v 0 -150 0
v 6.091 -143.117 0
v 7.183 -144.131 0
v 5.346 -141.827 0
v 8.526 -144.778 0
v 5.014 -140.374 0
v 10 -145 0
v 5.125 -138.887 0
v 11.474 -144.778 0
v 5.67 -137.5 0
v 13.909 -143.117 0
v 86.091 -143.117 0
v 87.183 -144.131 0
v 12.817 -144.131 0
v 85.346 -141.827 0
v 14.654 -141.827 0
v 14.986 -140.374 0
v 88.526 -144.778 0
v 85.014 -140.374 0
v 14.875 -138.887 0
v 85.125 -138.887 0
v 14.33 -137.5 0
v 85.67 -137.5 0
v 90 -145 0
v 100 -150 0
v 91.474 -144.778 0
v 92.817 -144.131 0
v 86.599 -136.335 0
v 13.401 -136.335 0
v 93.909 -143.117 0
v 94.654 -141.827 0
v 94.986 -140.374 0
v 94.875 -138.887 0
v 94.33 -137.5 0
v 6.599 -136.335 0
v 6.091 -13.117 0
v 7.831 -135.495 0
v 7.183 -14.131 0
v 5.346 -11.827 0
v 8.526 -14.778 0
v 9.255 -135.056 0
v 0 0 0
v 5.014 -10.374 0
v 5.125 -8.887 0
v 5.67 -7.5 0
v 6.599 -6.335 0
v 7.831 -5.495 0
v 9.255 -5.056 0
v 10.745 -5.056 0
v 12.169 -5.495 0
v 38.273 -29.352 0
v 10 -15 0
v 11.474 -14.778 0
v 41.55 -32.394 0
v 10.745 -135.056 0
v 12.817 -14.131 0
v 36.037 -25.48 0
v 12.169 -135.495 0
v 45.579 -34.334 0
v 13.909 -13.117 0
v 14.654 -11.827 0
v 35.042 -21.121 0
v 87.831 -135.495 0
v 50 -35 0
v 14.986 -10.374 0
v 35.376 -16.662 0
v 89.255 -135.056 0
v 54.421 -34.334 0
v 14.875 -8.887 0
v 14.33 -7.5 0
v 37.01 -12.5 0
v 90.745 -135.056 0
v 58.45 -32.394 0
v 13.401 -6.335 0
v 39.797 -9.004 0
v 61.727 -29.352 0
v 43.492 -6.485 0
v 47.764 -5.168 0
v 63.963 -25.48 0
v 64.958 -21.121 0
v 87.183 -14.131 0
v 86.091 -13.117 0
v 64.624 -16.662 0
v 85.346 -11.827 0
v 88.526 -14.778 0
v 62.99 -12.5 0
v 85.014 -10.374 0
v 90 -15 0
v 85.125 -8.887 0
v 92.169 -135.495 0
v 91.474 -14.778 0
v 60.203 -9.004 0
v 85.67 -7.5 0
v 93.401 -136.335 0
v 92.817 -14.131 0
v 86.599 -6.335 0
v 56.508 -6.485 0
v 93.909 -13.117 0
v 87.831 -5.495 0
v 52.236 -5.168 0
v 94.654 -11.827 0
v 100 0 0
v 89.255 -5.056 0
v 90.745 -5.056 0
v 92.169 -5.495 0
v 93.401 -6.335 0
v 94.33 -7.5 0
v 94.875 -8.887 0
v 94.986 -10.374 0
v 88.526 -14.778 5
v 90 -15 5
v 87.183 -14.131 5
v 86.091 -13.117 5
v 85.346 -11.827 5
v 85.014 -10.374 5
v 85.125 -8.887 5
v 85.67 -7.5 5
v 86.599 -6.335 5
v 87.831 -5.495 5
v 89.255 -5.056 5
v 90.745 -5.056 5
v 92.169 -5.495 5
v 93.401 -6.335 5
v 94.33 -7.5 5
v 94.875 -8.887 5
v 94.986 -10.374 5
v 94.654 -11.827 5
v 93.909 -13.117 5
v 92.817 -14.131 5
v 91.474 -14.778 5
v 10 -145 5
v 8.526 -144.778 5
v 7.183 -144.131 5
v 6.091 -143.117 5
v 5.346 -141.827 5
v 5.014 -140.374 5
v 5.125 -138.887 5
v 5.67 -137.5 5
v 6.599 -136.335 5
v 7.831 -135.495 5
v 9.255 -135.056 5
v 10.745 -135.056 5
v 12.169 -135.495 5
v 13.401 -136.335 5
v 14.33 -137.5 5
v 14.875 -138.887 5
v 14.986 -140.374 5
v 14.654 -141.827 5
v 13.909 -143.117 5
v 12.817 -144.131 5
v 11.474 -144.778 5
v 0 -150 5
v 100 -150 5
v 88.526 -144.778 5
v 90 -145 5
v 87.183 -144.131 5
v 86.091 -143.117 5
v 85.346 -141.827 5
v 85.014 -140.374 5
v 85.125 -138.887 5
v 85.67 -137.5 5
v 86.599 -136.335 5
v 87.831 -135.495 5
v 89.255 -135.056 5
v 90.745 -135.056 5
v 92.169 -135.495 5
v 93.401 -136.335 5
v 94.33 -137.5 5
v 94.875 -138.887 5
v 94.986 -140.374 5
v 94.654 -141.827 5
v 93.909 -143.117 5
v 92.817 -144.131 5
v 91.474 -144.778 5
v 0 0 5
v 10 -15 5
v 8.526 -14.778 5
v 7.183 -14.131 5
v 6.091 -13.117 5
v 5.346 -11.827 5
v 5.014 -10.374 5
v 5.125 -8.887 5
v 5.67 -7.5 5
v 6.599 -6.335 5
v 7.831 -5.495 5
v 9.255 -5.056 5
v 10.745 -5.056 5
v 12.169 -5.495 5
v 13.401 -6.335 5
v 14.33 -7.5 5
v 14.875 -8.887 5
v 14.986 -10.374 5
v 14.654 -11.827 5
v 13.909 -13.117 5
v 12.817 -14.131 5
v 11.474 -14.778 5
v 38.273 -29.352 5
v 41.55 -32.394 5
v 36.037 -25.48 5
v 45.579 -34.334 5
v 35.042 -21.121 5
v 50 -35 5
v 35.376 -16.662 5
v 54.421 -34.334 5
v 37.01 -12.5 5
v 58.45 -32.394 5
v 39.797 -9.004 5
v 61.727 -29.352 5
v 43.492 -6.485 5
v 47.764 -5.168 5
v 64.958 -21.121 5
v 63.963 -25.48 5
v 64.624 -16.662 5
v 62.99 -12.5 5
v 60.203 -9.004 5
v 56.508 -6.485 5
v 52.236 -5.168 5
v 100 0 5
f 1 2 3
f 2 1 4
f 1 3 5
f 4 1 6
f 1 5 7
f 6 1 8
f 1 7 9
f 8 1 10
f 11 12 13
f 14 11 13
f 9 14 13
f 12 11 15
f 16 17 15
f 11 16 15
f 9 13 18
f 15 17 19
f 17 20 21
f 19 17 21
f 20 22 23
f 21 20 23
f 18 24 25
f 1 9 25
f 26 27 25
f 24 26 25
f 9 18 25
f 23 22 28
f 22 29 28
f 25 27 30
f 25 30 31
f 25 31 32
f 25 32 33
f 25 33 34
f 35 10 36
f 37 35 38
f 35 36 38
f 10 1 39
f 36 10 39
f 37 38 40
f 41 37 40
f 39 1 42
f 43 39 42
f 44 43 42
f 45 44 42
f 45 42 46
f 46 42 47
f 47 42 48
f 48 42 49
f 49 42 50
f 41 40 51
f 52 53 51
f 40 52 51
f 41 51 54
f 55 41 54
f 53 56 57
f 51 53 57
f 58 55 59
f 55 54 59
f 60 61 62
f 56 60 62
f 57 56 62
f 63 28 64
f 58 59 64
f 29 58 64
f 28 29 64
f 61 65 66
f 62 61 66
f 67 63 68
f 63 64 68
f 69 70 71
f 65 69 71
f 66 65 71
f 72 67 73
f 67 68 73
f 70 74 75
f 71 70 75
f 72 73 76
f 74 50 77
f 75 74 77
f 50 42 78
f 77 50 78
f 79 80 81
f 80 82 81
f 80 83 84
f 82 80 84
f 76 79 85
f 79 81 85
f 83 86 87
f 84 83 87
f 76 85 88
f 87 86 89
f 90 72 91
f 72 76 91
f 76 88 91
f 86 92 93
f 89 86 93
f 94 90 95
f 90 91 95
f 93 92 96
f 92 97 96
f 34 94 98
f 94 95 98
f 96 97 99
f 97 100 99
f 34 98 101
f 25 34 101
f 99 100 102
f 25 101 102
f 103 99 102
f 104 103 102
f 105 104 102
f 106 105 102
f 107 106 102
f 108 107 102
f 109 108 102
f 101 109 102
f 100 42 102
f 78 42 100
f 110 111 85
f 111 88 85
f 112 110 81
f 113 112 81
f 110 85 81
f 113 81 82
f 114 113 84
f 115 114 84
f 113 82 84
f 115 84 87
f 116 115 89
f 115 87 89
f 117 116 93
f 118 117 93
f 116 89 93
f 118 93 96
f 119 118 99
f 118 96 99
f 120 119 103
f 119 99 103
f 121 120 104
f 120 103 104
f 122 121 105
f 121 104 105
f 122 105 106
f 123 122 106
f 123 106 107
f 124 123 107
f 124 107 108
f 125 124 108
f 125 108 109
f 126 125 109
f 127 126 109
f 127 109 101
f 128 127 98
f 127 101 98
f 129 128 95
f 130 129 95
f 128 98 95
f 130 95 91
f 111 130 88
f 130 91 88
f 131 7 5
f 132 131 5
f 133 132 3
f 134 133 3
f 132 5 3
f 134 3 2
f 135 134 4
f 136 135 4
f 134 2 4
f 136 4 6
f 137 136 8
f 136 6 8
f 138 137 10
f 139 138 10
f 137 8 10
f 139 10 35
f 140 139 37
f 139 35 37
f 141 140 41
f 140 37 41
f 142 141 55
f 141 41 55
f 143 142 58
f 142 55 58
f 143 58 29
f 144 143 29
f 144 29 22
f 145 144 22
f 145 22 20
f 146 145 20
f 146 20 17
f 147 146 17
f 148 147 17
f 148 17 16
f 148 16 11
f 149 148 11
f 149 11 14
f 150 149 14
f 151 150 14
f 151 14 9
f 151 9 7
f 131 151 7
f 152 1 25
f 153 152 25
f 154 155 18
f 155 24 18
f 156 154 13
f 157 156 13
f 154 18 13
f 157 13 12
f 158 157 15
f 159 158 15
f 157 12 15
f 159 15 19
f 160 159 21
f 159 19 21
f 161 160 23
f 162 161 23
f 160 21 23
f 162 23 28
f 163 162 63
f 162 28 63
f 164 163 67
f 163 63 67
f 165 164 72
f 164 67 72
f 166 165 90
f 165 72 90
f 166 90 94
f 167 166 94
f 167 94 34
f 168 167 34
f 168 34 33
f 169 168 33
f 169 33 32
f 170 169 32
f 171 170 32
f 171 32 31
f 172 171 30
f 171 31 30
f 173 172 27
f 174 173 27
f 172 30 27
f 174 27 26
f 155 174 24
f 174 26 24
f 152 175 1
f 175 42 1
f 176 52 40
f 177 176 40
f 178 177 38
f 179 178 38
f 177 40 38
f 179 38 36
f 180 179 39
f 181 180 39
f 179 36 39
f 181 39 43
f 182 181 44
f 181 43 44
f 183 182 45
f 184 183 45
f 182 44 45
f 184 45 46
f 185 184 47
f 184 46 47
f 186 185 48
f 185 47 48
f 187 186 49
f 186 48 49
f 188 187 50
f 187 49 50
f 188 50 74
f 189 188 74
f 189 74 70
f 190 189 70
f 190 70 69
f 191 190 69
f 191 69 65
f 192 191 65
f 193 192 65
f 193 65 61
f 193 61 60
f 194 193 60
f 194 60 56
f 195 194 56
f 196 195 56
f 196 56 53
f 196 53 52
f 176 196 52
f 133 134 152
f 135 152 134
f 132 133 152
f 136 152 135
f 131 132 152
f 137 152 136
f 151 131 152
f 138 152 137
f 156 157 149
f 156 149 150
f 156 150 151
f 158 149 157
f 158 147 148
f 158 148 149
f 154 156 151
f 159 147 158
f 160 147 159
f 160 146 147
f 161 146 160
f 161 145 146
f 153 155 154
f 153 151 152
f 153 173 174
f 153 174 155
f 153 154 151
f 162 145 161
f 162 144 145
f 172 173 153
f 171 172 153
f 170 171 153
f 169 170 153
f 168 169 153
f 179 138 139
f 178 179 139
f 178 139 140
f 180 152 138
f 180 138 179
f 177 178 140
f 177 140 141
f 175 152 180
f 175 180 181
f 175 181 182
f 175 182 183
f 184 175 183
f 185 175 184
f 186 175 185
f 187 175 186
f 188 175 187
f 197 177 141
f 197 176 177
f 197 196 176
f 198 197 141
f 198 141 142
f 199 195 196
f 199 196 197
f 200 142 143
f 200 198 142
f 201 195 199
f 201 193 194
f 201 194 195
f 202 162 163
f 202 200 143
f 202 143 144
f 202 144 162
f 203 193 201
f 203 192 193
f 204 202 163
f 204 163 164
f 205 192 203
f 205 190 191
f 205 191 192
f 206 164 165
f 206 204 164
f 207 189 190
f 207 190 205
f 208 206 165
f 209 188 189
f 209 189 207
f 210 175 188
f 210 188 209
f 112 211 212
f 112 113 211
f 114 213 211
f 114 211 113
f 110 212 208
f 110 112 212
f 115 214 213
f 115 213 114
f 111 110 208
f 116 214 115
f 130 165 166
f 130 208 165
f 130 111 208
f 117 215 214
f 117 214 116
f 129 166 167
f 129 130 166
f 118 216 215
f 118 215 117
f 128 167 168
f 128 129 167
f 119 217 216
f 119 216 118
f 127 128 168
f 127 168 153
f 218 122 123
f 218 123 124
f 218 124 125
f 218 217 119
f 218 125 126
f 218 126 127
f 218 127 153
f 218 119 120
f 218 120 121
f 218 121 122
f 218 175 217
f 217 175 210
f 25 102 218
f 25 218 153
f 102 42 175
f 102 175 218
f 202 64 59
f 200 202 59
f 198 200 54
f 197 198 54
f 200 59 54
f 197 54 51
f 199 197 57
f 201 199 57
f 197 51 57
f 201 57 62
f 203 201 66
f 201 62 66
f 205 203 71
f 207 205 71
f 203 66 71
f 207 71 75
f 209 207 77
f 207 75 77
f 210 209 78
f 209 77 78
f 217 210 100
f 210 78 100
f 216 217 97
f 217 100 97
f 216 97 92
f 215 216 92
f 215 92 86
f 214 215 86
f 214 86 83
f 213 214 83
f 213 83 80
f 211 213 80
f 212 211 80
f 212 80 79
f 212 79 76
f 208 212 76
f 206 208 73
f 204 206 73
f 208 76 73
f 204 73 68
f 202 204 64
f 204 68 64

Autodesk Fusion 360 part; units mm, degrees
sketch "Sketch1" plane through (0, 0, 0) normal (0, 0, 1) x (1, 0, 0)
  line L0 (0, 0) -> (100, 0)
  line L1 (100, 0) -> (100, -150)
  line L2 (0, 0) -> (0, -150)
  line L3 (0, -150) -> (100, -150)
  dimension "d1" = 100
  dimension "d2" = 150
extrude "Extrude1" add sketch "Sketch1" along normal blind 5
hole "Hole1" at (10, -10, 5) direction (0, 0, -1) diameter 10 depth 5 tip angle 180
hole "Hole2" at (90, -10, 5) direction (0, 0, -1) diameter 10 depth 5 tip angle 180
hole "Hole3" at (10, -140, 5) direction (0, 0, -1) diameter 10 depth 5 tip angle 180
hole "Hole4" at (90, -140, 5) direction (0, 0, -1) diameter 10 depth 5 tip angle 180
hole "Hole5" at (50, -20, 5) direction (0, 0, -1) diameter 30 depth 5 tip angle 180
